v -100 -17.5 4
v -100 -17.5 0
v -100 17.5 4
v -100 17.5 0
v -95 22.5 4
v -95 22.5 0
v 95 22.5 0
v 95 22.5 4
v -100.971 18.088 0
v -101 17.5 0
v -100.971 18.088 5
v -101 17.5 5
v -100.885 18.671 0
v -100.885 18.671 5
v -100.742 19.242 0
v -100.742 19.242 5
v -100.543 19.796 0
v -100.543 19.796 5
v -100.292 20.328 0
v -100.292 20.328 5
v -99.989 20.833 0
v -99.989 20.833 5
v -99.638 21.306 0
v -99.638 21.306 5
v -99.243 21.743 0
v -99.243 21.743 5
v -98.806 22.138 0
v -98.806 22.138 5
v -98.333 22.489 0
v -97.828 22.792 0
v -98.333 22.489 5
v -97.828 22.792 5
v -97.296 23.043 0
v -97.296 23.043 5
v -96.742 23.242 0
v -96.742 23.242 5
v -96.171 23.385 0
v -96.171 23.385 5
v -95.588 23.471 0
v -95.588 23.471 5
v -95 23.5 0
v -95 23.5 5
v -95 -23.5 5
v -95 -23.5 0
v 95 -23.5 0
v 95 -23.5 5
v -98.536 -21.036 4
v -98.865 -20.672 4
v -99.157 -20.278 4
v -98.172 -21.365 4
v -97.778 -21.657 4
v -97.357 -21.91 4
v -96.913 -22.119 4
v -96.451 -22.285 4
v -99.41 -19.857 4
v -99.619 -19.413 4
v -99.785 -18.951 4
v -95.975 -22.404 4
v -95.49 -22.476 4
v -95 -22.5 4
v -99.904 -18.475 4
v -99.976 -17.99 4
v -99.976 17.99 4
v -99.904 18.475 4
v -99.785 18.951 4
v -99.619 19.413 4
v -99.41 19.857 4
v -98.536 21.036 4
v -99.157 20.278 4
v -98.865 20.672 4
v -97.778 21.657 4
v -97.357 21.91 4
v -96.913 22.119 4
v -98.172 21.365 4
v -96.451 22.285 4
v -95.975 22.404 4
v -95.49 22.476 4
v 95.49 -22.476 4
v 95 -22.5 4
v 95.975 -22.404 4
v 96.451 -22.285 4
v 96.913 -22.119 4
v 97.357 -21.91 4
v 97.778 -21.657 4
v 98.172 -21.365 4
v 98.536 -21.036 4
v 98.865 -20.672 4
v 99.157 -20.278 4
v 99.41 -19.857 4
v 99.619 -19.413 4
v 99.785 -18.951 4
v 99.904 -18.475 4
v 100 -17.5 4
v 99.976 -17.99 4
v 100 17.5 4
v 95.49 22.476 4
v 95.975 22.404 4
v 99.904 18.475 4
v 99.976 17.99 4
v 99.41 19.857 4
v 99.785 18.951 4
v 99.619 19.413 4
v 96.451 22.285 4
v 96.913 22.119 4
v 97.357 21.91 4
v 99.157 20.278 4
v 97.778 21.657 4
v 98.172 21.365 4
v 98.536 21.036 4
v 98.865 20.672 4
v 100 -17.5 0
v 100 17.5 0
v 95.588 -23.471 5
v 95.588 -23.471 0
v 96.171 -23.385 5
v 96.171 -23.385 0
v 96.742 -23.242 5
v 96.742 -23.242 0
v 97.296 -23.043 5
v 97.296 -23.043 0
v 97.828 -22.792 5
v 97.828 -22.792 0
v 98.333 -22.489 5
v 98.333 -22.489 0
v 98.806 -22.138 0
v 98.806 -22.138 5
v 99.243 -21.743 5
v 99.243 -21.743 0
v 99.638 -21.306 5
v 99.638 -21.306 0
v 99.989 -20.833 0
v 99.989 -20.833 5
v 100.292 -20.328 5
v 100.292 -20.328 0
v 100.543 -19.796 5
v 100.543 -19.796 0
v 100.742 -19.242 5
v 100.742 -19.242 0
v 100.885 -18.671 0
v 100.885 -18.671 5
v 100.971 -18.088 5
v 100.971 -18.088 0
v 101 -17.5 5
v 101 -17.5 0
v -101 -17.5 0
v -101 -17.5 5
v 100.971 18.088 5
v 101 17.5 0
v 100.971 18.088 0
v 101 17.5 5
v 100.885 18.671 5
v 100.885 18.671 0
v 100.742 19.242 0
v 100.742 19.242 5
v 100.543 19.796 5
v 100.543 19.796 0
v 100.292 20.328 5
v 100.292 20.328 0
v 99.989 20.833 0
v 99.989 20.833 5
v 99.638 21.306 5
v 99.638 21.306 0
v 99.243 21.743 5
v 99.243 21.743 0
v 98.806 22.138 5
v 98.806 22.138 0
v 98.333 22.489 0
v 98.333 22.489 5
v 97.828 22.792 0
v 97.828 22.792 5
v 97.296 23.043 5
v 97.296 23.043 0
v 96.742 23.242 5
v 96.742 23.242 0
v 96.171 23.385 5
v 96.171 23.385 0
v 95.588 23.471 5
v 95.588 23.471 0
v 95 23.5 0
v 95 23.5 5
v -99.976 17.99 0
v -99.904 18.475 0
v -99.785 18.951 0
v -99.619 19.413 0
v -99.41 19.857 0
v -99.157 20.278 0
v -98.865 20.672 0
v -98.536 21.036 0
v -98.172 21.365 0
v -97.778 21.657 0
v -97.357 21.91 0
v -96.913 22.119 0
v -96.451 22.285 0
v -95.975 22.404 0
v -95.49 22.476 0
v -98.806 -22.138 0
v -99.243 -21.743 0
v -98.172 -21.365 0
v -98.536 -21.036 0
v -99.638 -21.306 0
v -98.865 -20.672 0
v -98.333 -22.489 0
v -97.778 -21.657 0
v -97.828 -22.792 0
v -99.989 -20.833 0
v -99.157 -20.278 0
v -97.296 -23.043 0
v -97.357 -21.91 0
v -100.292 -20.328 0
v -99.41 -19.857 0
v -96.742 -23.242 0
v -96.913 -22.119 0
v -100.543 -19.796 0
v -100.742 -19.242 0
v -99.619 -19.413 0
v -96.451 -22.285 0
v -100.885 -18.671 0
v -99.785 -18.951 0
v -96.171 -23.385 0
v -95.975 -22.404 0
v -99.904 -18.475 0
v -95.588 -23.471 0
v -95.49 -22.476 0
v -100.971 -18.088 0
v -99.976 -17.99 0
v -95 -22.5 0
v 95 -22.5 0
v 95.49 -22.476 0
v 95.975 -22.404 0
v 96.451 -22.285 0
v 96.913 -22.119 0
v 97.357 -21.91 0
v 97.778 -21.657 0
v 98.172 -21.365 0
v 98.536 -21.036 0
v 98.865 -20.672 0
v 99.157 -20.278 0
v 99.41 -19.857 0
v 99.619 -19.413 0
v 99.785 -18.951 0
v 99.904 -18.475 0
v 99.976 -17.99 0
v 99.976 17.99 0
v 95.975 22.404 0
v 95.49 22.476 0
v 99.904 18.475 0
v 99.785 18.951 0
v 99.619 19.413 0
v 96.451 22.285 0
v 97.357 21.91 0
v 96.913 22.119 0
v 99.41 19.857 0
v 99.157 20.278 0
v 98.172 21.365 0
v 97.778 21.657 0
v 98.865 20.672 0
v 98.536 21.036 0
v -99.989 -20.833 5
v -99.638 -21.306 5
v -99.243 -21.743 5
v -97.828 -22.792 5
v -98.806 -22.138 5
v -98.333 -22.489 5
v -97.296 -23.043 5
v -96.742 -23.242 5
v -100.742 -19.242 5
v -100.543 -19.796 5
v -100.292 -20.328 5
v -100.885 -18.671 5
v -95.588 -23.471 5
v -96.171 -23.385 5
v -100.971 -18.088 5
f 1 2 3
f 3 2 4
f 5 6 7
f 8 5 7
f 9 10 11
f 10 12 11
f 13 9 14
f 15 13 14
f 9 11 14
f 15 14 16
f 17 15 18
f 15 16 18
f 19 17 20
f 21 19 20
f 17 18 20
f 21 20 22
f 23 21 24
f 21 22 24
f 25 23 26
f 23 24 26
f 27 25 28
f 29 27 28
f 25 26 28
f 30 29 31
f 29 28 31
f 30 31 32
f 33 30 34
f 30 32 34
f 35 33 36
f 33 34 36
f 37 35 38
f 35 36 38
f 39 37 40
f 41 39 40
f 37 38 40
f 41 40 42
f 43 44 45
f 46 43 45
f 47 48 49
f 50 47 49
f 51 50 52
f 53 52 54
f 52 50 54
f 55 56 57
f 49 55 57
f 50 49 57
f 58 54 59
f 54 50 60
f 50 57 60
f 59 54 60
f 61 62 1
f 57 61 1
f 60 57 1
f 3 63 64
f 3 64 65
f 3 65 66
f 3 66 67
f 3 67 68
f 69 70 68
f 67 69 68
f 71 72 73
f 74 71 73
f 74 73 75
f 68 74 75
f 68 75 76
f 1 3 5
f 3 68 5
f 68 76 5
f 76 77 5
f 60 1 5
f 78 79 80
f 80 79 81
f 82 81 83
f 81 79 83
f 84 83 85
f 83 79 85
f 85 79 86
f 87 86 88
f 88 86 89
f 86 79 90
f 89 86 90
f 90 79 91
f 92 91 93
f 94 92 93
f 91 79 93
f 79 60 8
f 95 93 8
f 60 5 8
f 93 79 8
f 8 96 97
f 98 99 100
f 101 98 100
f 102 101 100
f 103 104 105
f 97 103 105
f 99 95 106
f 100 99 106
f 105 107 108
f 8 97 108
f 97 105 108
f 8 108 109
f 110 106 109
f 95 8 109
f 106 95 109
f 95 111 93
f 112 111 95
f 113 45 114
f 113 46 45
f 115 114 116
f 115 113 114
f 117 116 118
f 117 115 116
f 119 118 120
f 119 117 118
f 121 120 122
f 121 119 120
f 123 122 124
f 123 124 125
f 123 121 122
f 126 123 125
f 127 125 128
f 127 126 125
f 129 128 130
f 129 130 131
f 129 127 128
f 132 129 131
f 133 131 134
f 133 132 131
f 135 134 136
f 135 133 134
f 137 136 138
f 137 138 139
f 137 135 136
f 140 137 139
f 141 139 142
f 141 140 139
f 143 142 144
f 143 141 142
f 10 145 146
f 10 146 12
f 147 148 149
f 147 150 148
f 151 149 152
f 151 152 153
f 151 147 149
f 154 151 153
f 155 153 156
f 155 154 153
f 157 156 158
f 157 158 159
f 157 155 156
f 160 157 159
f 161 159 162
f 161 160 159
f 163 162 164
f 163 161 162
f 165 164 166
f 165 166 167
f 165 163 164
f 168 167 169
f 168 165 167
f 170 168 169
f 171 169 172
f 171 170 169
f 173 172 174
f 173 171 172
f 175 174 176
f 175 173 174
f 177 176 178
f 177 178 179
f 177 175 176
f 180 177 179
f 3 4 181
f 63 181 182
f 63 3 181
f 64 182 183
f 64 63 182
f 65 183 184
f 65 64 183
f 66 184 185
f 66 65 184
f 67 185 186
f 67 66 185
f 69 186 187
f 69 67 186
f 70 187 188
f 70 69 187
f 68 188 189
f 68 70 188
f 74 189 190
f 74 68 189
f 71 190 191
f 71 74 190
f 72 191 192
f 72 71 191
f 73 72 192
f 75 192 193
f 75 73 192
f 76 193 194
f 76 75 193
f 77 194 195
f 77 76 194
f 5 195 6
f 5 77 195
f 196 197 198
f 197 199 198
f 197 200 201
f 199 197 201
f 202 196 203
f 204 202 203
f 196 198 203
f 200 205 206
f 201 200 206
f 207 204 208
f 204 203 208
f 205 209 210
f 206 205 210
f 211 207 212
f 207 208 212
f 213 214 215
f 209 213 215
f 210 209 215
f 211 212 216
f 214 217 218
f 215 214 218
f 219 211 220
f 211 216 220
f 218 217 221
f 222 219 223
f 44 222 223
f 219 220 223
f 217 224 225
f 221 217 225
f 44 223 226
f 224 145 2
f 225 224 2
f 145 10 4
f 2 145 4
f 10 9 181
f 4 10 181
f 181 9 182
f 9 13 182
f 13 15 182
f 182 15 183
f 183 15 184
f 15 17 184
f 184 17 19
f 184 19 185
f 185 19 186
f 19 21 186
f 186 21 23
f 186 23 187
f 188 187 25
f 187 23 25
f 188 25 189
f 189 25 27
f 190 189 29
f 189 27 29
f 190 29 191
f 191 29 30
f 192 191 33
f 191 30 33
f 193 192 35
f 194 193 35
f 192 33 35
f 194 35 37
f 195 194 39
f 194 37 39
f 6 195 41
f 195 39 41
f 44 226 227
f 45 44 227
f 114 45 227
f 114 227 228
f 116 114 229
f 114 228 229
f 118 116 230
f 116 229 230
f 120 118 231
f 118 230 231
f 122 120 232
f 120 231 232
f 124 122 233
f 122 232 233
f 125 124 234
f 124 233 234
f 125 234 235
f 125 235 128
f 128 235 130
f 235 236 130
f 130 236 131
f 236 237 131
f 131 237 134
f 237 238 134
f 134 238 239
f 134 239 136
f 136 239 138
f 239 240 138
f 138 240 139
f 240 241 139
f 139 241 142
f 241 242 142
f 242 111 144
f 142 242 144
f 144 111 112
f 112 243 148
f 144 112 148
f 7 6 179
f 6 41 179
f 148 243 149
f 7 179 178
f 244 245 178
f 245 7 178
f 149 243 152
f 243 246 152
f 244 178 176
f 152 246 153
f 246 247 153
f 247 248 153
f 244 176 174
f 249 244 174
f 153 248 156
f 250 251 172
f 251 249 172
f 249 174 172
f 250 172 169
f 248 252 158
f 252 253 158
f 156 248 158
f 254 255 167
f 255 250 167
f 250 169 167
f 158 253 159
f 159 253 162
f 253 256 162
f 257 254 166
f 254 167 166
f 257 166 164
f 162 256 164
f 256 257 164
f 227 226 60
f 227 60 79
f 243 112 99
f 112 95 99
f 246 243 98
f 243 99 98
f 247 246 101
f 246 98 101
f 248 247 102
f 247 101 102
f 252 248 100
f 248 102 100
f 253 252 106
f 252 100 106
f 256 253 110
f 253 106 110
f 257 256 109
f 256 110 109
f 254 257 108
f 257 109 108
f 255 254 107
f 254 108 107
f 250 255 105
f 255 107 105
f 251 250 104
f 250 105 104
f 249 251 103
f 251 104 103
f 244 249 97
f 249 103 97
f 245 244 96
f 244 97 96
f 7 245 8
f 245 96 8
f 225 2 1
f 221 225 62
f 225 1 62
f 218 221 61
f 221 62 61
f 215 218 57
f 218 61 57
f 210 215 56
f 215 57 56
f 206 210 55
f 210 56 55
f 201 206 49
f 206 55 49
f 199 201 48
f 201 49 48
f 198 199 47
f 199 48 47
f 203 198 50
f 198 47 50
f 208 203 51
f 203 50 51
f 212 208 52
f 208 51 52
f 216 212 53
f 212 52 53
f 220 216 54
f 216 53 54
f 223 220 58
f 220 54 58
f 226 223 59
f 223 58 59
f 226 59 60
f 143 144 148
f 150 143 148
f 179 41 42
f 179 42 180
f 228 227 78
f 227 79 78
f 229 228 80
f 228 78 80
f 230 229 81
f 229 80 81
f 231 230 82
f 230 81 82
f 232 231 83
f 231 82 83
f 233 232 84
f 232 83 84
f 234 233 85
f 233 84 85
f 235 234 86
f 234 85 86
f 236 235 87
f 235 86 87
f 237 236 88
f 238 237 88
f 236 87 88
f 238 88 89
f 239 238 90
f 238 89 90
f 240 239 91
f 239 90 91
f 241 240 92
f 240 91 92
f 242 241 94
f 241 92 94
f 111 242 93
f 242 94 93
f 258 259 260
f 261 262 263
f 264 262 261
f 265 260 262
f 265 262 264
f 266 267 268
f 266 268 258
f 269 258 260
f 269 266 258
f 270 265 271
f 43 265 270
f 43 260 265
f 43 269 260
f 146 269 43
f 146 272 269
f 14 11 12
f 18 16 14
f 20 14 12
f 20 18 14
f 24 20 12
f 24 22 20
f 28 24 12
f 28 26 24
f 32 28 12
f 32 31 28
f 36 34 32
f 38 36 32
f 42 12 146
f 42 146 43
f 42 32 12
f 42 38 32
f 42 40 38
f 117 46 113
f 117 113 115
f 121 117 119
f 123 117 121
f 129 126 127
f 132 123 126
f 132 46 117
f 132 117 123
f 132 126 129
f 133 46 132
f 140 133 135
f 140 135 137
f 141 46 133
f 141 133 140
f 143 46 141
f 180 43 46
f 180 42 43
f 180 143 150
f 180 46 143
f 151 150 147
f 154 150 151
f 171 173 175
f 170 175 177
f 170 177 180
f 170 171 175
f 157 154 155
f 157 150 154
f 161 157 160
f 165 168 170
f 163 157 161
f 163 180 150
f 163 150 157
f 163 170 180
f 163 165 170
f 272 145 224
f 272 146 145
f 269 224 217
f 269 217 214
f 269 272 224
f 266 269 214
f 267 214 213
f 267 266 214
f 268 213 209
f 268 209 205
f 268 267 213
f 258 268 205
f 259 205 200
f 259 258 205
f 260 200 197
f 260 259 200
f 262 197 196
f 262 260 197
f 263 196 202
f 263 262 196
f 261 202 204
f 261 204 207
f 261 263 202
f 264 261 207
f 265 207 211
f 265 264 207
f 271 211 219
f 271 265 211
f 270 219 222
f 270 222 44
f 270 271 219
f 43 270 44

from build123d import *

# Parameters (mm, degrees)
SKETCH002_W    = 202
SKETCH002_H    = 47
PAD001_DEPTH   = 5
FILLET001_R    = 6
THICKNESS001_T = -1


with BuildPart() as part:
    # Sketch002 → Pad001 (new body)
    with BuildSketch(Plane.XY):
        Rectangle(SKETCH002_W, SKETCH002_H)
    extrude(amount=PAD001_DEPTH)

    # Fillet001
    fillet001_edges = [part.edges().sort_by_distance(p)[0] for p in [
        (-101, -23.5, 2.5),
        (101, -23.5, 2.5),
        (-101, 23.5, 2.5),
        (101, 23.5, 2.5),
    ]]
    fillet(fillet001_edges, radius=FILLET001_R)

    # Thickness001
    thickness001_openings = [part.faces().sort_by_distance(p)[0] for p in [
        (0, 0, 0),
    ]]
    offset(amount=THICKNESS001_T, openings=thickness001_openings)


solid = part.part
